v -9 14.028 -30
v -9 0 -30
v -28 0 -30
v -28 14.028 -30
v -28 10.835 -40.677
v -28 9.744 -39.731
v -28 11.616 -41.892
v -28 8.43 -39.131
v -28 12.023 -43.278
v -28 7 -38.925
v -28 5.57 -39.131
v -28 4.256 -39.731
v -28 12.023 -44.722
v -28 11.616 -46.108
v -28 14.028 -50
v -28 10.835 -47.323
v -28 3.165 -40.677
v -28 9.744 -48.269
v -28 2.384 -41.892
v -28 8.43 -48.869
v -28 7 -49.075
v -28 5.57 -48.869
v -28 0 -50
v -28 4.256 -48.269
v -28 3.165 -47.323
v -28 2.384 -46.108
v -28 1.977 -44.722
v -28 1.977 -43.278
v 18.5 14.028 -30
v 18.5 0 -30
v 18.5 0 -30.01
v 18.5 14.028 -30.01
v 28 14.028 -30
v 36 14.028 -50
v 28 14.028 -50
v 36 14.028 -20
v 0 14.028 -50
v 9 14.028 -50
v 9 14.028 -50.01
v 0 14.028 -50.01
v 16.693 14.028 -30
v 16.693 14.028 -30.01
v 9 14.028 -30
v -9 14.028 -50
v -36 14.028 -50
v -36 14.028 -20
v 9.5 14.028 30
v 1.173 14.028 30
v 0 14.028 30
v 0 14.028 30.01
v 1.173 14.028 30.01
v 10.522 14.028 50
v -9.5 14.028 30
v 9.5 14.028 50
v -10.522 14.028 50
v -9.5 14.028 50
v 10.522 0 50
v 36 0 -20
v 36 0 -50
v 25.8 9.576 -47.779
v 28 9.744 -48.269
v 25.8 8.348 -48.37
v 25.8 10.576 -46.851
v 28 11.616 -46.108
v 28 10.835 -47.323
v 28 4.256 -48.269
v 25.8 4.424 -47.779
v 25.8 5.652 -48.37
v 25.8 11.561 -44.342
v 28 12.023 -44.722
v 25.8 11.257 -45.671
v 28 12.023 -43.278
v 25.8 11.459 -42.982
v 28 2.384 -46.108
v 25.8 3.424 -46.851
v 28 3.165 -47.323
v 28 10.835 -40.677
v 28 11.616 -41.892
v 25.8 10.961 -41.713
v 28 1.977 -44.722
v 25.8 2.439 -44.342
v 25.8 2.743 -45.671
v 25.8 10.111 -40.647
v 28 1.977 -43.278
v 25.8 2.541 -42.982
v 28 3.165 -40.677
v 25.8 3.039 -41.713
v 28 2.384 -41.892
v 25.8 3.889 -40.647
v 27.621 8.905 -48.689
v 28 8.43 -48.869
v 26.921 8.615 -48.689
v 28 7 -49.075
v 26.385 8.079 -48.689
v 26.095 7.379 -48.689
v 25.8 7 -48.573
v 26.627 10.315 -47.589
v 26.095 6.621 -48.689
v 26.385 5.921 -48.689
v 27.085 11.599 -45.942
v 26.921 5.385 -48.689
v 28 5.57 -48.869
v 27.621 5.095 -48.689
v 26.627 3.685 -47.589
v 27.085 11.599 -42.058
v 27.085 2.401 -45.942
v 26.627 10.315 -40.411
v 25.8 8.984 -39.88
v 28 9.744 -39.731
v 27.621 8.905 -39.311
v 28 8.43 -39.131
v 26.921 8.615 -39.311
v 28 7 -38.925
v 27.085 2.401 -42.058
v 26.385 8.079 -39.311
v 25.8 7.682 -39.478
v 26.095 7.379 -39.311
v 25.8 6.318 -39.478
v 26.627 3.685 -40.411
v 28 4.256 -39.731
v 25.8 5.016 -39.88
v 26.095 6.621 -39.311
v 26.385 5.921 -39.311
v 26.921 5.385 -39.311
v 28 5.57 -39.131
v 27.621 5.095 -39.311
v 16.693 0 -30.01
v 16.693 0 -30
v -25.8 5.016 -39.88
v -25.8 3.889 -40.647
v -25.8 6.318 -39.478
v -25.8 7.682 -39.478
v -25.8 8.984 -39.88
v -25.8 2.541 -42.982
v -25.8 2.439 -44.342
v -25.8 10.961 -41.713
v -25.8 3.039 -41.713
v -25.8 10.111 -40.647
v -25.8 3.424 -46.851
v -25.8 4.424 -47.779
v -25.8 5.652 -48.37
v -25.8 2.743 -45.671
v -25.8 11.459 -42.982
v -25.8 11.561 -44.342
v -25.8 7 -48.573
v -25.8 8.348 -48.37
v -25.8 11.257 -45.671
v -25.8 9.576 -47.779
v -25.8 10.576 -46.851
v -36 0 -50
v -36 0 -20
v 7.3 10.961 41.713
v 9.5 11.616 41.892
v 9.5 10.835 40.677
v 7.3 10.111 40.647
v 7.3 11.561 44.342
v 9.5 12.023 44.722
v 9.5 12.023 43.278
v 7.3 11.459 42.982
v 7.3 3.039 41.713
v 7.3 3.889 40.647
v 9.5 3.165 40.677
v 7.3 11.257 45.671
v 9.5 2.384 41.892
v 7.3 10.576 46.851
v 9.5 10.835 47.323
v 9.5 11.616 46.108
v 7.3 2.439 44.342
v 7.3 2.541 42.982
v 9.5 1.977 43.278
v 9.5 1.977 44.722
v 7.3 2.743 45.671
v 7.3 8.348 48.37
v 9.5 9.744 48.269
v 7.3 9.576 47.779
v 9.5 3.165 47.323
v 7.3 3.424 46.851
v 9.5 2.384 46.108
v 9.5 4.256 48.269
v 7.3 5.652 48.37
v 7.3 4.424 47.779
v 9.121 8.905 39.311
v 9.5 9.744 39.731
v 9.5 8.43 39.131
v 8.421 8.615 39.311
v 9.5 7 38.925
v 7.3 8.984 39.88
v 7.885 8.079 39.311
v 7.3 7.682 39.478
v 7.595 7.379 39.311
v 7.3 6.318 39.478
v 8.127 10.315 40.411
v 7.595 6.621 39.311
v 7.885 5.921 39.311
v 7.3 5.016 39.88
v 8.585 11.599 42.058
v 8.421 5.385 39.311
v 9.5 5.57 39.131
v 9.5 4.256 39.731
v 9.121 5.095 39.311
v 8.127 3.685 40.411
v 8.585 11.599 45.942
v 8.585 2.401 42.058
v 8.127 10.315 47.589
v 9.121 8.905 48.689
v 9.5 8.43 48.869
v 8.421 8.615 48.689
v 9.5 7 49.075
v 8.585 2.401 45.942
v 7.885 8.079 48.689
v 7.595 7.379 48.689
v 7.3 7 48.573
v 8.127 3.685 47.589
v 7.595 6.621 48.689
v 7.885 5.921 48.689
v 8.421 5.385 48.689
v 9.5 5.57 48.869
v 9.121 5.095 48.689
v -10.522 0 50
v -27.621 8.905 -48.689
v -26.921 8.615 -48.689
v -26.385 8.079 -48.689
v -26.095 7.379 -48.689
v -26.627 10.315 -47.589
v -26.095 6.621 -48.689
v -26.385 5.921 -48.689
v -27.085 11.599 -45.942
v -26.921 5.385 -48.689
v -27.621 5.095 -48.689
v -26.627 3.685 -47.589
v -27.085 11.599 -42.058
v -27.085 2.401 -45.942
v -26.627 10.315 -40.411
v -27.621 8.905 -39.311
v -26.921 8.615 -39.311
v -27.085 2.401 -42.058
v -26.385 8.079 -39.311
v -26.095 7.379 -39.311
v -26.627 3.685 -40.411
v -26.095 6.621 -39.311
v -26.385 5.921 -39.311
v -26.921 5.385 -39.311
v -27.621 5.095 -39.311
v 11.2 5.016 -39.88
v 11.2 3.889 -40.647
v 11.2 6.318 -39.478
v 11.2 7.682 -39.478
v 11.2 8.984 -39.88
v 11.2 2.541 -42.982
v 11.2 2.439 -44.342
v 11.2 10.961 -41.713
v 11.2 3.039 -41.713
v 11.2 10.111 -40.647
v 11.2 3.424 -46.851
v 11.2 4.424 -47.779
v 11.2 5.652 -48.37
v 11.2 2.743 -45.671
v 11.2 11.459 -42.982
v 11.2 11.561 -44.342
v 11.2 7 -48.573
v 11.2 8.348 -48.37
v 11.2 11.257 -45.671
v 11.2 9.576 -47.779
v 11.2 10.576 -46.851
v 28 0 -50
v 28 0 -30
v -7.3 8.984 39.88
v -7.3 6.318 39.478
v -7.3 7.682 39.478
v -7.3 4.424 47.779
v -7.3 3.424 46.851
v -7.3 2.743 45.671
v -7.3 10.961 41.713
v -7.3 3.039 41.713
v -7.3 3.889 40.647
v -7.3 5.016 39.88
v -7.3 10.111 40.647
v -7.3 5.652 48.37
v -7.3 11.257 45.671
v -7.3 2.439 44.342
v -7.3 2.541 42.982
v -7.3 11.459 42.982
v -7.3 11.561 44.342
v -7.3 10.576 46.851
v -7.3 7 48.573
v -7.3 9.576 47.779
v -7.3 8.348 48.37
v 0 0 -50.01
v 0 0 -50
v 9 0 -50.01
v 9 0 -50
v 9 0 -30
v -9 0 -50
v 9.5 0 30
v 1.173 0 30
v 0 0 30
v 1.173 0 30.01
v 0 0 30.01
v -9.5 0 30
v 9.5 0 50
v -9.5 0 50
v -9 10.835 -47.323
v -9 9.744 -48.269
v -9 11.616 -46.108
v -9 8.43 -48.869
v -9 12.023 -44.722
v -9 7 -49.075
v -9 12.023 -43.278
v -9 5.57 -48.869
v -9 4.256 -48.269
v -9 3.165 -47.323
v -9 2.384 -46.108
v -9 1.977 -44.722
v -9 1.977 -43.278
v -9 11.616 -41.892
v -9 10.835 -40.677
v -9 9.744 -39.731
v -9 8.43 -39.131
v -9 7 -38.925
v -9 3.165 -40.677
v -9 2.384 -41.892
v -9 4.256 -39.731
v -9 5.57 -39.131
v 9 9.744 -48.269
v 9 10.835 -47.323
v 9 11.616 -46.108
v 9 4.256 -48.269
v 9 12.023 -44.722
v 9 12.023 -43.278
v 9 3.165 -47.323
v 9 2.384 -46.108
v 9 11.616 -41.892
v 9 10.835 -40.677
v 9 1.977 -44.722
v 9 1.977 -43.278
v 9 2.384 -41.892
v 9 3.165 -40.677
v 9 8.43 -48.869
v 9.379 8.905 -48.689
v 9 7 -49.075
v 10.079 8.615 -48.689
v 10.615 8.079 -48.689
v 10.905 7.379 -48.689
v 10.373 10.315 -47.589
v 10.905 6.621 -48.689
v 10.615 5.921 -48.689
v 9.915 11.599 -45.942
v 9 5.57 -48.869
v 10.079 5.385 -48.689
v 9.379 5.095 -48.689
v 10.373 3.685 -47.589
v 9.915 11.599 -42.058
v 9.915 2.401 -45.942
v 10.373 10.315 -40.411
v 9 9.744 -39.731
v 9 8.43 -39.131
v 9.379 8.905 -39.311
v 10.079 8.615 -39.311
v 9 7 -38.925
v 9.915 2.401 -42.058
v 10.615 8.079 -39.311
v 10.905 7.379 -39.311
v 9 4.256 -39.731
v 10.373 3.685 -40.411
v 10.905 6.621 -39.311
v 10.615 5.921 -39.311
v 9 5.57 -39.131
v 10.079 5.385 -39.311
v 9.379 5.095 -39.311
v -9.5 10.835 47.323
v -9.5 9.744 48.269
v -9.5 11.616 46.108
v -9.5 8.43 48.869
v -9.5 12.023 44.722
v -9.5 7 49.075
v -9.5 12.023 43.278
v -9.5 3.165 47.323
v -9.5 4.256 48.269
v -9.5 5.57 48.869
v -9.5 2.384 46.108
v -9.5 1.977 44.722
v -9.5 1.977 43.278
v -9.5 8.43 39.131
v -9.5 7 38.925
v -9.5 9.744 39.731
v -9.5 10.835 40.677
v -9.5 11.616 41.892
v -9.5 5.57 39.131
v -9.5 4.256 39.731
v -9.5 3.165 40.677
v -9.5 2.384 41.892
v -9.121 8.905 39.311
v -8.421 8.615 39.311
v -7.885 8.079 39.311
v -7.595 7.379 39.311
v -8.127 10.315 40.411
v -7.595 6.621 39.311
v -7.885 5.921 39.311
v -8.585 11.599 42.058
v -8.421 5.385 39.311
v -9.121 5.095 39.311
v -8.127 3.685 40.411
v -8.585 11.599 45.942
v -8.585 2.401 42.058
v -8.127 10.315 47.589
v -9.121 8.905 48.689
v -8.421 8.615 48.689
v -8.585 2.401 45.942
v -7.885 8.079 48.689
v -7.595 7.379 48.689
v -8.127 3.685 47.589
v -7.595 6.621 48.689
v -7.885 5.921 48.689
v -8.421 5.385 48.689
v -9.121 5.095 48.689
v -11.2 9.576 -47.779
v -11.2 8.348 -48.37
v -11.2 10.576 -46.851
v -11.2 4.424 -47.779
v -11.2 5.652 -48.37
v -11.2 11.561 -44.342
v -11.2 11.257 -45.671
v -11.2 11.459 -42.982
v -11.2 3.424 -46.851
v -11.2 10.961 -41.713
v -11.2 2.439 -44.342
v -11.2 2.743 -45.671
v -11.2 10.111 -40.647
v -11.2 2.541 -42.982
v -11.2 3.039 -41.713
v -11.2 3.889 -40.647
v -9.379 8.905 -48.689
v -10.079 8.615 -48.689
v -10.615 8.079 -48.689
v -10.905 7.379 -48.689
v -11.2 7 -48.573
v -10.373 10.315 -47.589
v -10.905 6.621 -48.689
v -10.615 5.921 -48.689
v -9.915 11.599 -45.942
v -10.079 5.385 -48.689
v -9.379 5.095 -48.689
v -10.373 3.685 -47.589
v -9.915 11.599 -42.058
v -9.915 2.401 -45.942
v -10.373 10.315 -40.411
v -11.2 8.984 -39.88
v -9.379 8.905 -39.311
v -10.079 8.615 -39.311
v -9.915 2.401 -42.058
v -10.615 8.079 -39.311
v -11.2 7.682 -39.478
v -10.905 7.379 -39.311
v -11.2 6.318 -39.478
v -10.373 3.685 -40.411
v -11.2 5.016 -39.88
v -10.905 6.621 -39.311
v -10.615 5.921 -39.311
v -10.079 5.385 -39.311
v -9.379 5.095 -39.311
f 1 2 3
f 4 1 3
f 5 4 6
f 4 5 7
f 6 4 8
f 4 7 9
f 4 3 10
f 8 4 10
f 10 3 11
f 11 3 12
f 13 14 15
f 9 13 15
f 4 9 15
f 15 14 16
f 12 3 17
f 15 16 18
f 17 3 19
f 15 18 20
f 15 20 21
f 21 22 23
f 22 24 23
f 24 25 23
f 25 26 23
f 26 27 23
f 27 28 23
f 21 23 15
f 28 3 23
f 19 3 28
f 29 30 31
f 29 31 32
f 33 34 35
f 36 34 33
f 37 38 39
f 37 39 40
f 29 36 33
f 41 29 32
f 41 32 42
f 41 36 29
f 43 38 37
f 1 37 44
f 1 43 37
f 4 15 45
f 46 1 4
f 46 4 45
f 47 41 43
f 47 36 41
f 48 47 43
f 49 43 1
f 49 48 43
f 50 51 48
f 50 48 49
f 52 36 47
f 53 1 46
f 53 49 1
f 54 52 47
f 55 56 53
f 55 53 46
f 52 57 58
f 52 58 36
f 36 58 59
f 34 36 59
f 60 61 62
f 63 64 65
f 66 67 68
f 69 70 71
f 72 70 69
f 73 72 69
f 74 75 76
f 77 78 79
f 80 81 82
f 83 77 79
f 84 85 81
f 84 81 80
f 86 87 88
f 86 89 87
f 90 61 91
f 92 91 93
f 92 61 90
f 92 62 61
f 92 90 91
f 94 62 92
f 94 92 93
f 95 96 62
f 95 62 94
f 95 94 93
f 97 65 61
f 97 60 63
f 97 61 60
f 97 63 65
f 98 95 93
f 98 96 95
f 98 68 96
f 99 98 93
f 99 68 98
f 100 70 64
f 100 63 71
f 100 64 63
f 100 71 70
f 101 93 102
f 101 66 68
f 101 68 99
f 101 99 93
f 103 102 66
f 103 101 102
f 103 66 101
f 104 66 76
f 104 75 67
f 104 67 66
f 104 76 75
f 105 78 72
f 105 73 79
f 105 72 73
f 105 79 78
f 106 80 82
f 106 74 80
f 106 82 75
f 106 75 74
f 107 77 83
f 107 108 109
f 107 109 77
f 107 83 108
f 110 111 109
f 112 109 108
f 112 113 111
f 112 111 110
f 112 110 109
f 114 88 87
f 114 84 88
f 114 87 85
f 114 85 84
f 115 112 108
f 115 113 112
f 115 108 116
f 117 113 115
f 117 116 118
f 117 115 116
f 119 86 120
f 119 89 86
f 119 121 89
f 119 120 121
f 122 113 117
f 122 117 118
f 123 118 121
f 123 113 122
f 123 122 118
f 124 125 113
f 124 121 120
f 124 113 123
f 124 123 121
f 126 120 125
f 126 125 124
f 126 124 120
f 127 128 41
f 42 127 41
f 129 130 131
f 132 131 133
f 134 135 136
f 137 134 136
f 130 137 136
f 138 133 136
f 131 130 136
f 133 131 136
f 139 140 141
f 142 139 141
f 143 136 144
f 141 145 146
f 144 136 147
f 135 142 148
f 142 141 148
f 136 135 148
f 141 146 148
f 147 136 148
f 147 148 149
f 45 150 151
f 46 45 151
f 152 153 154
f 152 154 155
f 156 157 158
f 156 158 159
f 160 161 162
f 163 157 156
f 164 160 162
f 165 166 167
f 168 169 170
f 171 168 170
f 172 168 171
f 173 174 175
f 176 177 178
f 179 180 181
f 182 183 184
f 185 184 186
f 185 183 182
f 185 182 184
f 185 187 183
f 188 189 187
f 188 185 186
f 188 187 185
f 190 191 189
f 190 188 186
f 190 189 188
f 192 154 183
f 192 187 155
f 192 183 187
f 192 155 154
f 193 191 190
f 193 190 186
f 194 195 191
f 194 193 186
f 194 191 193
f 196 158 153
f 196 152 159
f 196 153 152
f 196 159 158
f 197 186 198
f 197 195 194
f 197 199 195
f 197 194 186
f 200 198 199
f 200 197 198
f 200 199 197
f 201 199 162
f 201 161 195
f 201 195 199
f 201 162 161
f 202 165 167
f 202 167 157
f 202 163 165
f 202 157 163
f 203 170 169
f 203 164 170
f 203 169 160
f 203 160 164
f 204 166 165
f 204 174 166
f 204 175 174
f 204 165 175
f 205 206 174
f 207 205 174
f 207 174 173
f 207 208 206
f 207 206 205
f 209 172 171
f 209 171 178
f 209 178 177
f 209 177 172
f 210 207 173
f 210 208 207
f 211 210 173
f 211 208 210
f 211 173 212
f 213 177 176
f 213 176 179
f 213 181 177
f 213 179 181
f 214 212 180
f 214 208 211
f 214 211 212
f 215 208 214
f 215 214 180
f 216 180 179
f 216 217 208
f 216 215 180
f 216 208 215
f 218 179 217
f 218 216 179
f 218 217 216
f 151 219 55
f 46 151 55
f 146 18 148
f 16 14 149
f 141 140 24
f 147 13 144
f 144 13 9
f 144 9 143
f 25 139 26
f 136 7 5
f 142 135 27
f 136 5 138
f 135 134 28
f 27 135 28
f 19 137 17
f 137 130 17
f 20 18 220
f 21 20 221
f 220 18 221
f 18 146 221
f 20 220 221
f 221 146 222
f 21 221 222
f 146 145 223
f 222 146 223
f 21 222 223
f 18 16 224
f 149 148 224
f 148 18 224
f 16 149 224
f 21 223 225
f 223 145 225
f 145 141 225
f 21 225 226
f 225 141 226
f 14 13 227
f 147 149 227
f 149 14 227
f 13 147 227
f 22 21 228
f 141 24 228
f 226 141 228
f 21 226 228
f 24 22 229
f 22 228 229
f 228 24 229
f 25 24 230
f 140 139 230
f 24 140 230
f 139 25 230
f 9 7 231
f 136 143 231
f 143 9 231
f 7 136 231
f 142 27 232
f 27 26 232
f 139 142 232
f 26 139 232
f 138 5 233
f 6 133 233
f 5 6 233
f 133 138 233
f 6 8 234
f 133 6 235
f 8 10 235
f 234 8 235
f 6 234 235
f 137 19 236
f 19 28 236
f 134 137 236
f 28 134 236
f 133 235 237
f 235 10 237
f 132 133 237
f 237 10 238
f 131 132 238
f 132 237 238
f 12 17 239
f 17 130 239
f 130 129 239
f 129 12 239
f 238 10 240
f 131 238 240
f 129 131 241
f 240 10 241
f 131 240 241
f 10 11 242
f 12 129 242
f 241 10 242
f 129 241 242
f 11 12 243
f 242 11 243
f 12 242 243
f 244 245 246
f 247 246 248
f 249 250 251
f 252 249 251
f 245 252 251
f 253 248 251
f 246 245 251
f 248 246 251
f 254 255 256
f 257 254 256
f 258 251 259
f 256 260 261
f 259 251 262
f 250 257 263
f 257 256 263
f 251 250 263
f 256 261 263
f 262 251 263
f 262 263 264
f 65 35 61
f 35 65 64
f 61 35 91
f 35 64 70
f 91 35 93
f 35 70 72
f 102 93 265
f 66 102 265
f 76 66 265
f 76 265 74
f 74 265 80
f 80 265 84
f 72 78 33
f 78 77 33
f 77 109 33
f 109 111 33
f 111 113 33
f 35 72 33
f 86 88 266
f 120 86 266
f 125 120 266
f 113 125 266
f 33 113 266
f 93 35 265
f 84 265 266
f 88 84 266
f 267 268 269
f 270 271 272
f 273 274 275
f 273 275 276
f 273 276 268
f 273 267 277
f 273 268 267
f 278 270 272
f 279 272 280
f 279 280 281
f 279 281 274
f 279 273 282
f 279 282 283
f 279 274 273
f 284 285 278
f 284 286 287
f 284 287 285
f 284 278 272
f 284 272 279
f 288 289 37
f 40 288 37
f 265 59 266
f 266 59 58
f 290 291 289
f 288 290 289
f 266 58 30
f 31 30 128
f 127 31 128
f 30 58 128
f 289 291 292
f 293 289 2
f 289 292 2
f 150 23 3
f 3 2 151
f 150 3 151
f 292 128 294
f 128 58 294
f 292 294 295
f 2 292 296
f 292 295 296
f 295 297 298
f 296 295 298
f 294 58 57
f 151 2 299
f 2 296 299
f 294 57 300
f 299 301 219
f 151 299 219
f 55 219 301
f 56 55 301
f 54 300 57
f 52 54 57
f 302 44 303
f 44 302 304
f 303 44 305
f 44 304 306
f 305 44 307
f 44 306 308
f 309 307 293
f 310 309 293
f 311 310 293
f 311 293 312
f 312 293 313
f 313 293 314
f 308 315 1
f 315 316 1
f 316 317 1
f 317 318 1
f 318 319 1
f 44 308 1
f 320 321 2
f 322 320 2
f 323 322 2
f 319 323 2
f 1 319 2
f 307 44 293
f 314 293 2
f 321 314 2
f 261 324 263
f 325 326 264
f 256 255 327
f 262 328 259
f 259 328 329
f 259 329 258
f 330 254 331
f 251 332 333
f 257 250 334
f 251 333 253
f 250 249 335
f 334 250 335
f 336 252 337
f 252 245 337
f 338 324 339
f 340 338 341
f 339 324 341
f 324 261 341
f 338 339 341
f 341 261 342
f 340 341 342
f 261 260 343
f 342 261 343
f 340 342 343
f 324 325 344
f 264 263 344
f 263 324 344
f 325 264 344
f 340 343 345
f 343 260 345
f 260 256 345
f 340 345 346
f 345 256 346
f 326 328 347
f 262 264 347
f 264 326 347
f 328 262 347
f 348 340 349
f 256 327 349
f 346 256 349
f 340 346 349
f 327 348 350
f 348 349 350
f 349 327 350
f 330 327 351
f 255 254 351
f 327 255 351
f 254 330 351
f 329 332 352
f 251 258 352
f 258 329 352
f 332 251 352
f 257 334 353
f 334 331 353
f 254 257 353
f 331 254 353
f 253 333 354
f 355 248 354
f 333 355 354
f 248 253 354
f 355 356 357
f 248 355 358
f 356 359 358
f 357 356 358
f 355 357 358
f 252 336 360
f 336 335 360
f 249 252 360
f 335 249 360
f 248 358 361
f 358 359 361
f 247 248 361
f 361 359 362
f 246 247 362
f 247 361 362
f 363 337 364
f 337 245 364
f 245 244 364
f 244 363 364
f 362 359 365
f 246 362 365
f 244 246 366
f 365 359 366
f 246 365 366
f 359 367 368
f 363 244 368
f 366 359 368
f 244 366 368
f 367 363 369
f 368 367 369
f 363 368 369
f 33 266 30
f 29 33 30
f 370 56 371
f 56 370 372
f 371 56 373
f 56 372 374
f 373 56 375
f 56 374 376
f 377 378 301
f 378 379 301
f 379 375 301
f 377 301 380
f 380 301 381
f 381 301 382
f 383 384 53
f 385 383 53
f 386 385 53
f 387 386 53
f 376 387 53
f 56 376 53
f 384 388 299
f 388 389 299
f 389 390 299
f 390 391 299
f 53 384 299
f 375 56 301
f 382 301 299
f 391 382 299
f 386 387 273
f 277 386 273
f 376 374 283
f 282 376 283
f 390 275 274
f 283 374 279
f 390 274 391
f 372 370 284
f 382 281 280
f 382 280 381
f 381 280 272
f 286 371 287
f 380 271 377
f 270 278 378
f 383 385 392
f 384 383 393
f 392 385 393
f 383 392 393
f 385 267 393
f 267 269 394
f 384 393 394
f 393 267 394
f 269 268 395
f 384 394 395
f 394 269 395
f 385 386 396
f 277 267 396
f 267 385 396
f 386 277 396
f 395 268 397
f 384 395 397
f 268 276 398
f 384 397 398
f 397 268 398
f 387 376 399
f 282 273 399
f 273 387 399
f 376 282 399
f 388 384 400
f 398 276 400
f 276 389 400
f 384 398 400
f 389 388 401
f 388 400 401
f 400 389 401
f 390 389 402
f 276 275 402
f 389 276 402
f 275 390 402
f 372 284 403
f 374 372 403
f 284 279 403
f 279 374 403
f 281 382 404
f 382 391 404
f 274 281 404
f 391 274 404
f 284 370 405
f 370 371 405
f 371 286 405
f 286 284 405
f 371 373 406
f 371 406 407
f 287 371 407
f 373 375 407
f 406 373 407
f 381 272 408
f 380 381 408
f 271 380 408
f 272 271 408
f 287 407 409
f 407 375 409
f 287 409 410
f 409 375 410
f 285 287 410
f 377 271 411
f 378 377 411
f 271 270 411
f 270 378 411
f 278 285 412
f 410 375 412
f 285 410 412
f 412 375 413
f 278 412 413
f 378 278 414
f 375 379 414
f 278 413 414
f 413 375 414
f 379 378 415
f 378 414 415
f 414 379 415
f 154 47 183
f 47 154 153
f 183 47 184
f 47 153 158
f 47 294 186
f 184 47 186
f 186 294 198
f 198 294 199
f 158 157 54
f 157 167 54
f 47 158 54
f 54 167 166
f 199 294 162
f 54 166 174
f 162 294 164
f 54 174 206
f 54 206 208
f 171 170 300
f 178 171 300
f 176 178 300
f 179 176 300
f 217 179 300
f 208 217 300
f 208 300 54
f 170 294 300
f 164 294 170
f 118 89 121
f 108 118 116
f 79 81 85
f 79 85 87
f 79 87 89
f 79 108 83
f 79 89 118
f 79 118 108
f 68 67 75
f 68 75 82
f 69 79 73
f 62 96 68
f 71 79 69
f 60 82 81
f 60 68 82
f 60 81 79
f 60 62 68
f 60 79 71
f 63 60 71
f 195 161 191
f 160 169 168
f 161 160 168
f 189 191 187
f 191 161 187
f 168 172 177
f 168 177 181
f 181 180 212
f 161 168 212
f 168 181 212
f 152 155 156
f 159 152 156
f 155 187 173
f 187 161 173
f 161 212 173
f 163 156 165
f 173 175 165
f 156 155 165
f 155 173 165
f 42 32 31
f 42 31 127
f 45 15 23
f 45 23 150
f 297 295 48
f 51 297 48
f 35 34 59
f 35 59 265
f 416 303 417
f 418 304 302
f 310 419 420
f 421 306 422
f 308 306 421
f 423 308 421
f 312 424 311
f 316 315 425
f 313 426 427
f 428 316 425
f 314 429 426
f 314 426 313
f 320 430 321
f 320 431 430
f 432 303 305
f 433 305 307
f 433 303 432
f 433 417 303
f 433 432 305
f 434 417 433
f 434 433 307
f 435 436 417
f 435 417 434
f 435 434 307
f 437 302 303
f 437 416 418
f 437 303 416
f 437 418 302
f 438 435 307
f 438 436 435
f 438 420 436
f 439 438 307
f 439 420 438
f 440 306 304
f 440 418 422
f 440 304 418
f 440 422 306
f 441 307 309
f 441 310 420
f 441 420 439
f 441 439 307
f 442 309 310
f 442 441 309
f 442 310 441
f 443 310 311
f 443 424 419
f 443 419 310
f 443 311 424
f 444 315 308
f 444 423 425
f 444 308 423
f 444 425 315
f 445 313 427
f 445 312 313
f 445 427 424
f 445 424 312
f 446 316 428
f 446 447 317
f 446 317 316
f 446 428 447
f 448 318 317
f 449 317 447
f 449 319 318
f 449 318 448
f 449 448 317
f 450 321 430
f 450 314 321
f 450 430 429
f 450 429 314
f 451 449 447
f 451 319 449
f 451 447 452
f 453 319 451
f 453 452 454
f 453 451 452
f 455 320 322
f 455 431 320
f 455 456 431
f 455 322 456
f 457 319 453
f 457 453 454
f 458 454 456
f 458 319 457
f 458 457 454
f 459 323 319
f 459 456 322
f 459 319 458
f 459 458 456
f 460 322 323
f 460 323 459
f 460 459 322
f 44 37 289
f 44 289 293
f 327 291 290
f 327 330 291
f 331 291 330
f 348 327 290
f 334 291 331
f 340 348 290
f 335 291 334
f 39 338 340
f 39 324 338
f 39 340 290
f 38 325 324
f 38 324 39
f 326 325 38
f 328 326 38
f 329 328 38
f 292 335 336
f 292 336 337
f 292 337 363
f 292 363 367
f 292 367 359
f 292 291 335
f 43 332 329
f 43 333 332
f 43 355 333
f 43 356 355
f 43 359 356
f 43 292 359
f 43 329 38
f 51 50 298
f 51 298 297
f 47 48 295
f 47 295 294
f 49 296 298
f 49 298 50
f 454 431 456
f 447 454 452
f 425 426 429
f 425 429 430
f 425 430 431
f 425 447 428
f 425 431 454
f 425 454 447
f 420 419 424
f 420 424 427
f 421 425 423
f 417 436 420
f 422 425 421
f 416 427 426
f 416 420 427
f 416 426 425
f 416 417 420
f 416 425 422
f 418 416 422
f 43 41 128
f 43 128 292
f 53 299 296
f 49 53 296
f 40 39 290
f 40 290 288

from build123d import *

# Parameters (mm, degrees)
BOSS_EXTRUDE1_DEPTH  = 14.027771651
CHAMFER1_SIZE        = 70
CHAMFER1_SIZE2       = 25.477916399
CHAMFER2_SIZE        = 70
CHAMFER2_SIZE2       = 25.477916399
REVOLVE1_ANGLE       = 180
SKETCH5_W            = 3.372425282
SKETCH5_H            = 11.999559726
CUT_EXTRUDE1_DEPTH   = 12
REVOLVE2_ANGLE       = 180
SKETCH10_W           = 9
SKETCH10_H           = 14.027771651
BOSS_EXTRUDE2_DEPTH  = 0.01
SKETCH11_W           = 1.173488445
SKETCH11_H           = 14.027771651
BOSS_EXTRUDE3_DEPTH  = 0.01
SKETCH12_W           = 3.597317039
SKETCH12_H           = 11.345384506
CUT_EXTRUDE2_DEPTH   = 12
SKETCH13_W           = 1.806847517
SKETCH13_H           = 14.027771651
BOSS_EXTRUDE4_DEPTH  = 0.01
MIRROR5_COPY_1_ANGLE = 180
MIRROR6_COPY_1_ANGLE = 180
MIRROR6_COPY_2_ANGLE = 180
SKETCH14_W           = 14.6
SKETCH14_H           = 11.534592578
CUT_EXTRUDE3_DEPTH   = 12


with BuildPart() as part:
    # Sketch1 → Boss-Extrude1 (new body)
    with BuildSketch(Plane(origin=(0, 0, 0), x_dir=(1, 0, 0), z_dir=(0, 1, 0))):
        Polygon((-28, 50), (-36, 50), (-36, -50), (-9.5, -50), (-9.5, -30), (9.5, -30), (9.5, -50), (36, -50), (36, 50), (28, 50), (28, 30), (9, 30), (9, 50), (-9, 50), (-9, 30), (-28, 30), align=None)
    extrude(amount=BOSS_EXTRUDE1_DEPTH)

    # Chamfer1
    chamfer1_edges = [part.edges().sort_by_distance(p)[0] for p in [
        (36, 7.013885825, 50),
    ]]
    chamfer1_side = [part.faces().sort_by_distance(p)[0] for p in [
        (36, 7.013885825, 0),
    ]]
    chamfer(chamfer1_edges, length=CHAMFER1_SIZE, length2=CHAMFER1_SIZE2, reference=chamfer1_side[0])

    # Chamfer2
    chamfer2_edges = [part.edges().sort_by_distance(p)[0] for p in [
        (-36, 7.013885825, 50),
    ]]
    chamfer2_side = [part.faces().sort_by_distance(p)[0] for p in [
        (-36, 7.013885825, 0),
    ]]
    chamfer(chamfer2_edges, length=CHAMFER2_SIZE, length2=CHAMFER2_SIZE2, reference=chamfer2_side[0])

    # Sketch4 → Revolve1 (revolve)
    with BuildSketch(Plane(origin=(-9.5, 0, 0), x_dir=(0, 0, -1), z_dir=(1, 0, 0))):
        with BuildLine():
            Line((-49.075, 7), (-38.925, 7))
            ThreePointArc((-38.925, 7), (-44, 12.075), (-49.075, 7))
        make_face()
    revolve1 = revolve(axis=Axis((-9.5, 7, 49.075), (0, 0, -1)), revolution_arc=REVOLVE1_ANGLE)

    # Sketch5 → Cut-Extrude1 (cut)
    with BuildSketch(Plane.XY.offset(50)):
        with Locations((-5.613787359, 7.519250292)):
            Rectangle(SKETCH5_W, SKETCH5_H)
    extrude(amount=-CUT_EXTRUDE1_DEPTH, mode=Mode.SUBTRACT)

    # Sketch8 → Revolve2 (revolve)
    with BuildSketch(Plane(origin=(-28, 0, 0), x_dir=(0, 0, -1), z_dir=(1, 0, 0))):
        with BuildLine():
            Line((38.925, 7), (49.075, 7))
            ThreePointArc((49.075, 7), (44, 12.075), (38.925, 7))
        make_face()
    revolve2 = revolve(axis=Axis((-28, 7, -38.925), (0, 0, -1)), revolution_arc=REVOLVE2_ANGLE)

    # Sketch10 → Boss-Extrude2 (add)
    with BuildSketch(Plane(origin=(0, 0, -50), x_dir=(-1, 0, 0), z_dir=(0, 0, -1))):
        with Locations((-4.5, 7.013885826)):
            Rectangle(SKETCH10_W, SKETCH10_H)
    extrude(amount=BOSS_EXTRUDE2_DEPTH)

    # Mirror2: Revolve2 across plane
    add(revolve2.mirror(Plane(origin=(0, 14.027771651, -50.01), x_dir=(0, 0, 1), z_dir=(1, 0, 0))))

    # Sketch11 → Boss-Extrude3 (add)
    with BuildSketch(Plane.XY.offset(30)):
        with Locations((0.586744223, 7.013885826)):
            Rectangle(SKETCH11_W, SKETCH11_H)
    extrude(amount=BOSS_EXTRUDE3_DEPTH)

    # Mirror4: Revolve1 across plane
    add(revolve1.mirror(Plane(origin=(0, 0, 30.01), x_dir=(0, 0, 1), z_dir=(1, 0, 0))))

    # Sketch12 → Cut-Extrude2 (cut)
    with BuildSketch(Plane.XY.offset(50)):
        with Locations((5.501341481, 7.065203355)):
            Rectangle(SKETCH12_W, SKETCH12_H)
    extrude(amount=-CUT_EXTRUDE2_DEPTH, mode=Mode.SUBTRACT)

    # Sketch13 → Boss-Extrude4 (add)
    with BuildSketch(Plane(origin=(0, 0, -30), x_dir=(-1, 0, 0), z_dir=(0, 0, -1))):
        with Locations((-17.596576242, 7.013885826)):
            Rectangle(SKETCH13_W, SKETCH13_H)
    extrude(amount=BOSS_EXTRUDE4_DEPTH)

    # Mirror5 copy 1 sketch → Mirror5 copy 1 (revolve)
    with BuildSketch(Plane(origin=(9, 0, 0), x_dir=(0, 0, -1), z_dir=(1, 0, 0))):
        with BuildLine():
            Line((38.925, 7), (49.075, 7))
            ThreePointArc((49.075, 7), (44, 12.075), (38.925, 7))
        make_face()
    revolve(axis=Axis((9, 7, -38.925), (0, 0, -1)), revolution_arc=MIRROR5_COPY_1_ANGLE)

    # Mirror6 copy 1 sketch → Mirror6 copy 1 (revolve)
    with BuildSketch(Plane(origin=(-9, 0, 0), x_dir=(0, 0, -1), z_dir=(-1, 0, 0))):
        with BuildLine():
            Line((38.925, -7), (49.075, -7))
            ThreePointArc((49.075, -7), (44, -12.075), (38.925, -7))
        make_face()
    revolve(axis=Axis((-9, 7, -38.925), (0, 0, 1)), revolution_arc=MIRROR6_COPY_1_ANGLE)

    # Mirror6 copy 2 sketch → Mirror6 copy 2 (revolve)
    with BuildSketch(Plane(origin=(28, 0, 0), x_dir=(0, 0, -1), z_dir=(-1, 0, 0))):
        with BuildLine():
            Line((38.925, -7), (49.075, -7))
            ThreePointArc((49.075, -7), (44, -12.075), (38.925, -7))
        make_face()
    revolve(axis=Axis((28, 7, -38.925), (0, 0, 1)), revolution_arc=MIRROR6_COPY_2_ANGLE)

    # Sketch14 → Cut-Extrude3 (cut)
    with BuildSketch(Plane(origin=(0, 0, -50), x_dir=(-1, 0, 0), z_dir=(0, 0, -1))):
        with Locations((-18.5, 6.982775721)):
            Rectangle(SKETCH14_W, SKETCH14_H)
        with Locations((18.5, 6.982775721)):
            Rectangle(SKETCH14_W, SKETCH14_H)
    extrude(amount=-CUT_EXTRUDE3_DEPTH, mode=Mode.SUBTRACT)


solid = part.part
